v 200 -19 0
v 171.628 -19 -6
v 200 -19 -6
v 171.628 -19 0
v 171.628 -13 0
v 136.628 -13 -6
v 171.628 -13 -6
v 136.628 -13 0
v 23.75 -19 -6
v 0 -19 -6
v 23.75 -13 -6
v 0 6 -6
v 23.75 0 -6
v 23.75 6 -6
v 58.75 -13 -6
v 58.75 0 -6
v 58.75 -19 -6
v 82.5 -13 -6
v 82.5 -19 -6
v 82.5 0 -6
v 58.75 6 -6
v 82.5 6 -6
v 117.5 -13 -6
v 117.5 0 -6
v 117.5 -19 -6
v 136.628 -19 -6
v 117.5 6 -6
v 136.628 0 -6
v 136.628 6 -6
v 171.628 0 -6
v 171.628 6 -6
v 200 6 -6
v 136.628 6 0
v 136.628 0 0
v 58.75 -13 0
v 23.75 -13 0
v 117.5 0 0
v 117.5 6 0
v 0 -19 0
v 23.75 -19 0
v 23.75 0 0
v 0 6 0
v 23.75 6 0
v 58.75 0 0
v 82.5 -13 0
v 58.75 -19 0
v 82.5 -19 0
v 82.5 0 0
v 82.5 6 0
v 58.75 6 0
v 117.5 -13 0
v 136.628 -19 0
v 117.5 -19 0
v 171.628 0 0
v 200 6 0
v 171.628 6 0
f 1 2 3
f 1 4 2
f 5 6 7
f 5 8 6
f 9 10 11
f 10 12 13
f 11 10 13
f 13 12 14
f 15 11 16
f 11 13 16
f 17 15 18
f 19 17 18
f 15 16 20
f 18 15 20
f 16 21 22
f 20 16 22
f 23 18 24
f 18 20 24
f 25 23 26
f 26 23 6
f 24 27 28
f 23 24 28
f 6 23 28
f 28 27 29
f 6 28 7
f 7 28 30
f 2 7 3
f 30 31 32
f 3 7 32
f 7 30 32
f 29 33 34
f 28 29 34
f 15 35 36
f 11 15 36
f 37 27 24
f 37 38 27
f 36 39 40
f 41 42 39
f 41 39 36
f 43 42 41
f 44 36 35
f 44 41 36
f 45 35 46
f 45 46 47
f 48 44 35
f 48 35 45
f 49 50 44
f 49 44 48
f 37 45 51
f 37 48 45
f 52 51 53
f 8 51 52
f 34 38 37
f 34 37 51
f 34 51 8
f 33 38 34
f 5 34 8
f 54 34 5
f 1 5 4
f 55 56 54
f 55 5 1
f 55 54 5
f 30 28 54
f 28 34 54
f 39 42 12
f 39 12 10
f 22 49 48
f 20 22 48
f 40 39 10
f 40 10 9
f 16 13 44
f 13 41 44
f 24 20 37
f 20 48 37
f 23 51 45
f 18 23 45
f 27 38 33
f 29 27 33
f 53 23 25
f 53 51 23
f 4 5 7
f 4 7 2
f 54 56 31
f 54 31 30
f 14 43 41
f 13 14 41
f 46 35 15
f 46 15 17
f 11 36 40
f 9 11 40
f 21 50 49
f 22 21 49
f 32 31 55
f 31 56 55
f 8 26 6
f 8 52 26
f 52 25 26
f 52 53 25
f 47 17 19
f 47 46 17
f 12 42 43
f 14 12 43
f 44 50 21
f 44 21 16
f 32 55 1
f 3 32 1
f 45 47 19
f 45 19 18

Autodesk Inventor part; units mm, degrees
ref_plane "YZ Plane" through (0, 0, 0) normal (1, 0, 0) x (0, 1, 0)
ref_plane "XZ Plane" through (0, 0, 0) normal (0, 1, 0) x (-1, 0, 0)
ref_plane "XY Plane" through (0, 0, 0) normal (0, 0, 1) x (1, 0, 0)
sketch "Sketch1" plane through (0, 0, 0) normal (0, 0, 1) x (1, 0, 0)
  line L0 (200, 0) -> (171.6283, 0) construction
  line L1 (200, 6) -> (200, 0)
  line L2 (171.6283, 6) -> (200, 6)
  line L3 (171.6283, 6) -> (171.6283, 0)
  line L4 (136.6283, 6) -> (136.6283, 0)
  line L5 (136.6283, 0) -> (171.6283, 0)
  line L6 (171.6283, 0) -> (171.6283, 6)
  line L7 (136.6283, 6) -> (171.6283, 6)
  line L8 (136.6283, 0) -> (117.5, 0) construction
  line L9 (136.6283, 6) -> (136.6283, 0)
  line L10 (117.5, 6) -> (136.6283, 6)
  line L11 (117.5, 6) -> (117.5, 0)
  line L12 (117.5, 0) -> (117.5, 6)
  line L13 (82.5, 6) -> (117.5, 6)
  line L14 (82.5, 6) -> (82.5, 0)
  line L15 (82.5, 0) -> (117.5, 0)
  line L16 (82.5, 0) -> (58.75, 0) construction
  line L17 (82.5, 6) -> (82.5, 0)
  line L18 (58.75, 6) -> (82.5, 6)
  line L19 (58.75, 6) -> (58.75, 0)
  line L20 (23.75, 6) -> (23.75, 0)
  line L21 (23.75, 0) -> (58.75, 0)
  line L22 (58.75, 0) -> (58.75, 6)
  line L23 (23.75, 6) -> (58.75, 6)
  line L24 (23.75, 0) -> (0, 0) construction
  line L25 (23.75, 6) -> (23.75, 0)
  line L26 (0, 6) -> (23.75, 6)
  line L27 (0, 0) -> (0, 6)
  line L28 (200, 6) -> (1.5061, 6)
  line L29 (1.5061, 6) -> (1.5061, -19)
  line L30 (1.5061, -19) -> (200, -19)
  line L31 (200, -19) -> (200, 6)
extrude "Extrusion1" add sketch "Sketch1" against normal blind 6 contours L1 L31 L30 L29 L26 L20 L21 L19 L18 L14 L15 L11 L10 L4 L5 L3 L2
sketch "Sketch2" plane through (0, 0, 0) normal (0, 0, 1) x (1, 0, 0)
  line L0 (200, 6) -> (171.6283, 6) projected
  line L1 (171.6283, 0) -> (171.6283, 6) projected
  line L2 (136.6283, 0) -> (171.6283, 0) projected
  line L3 (136.6283, 6) -> (136.6283, 0) projected
  line L4 (136.6283, 6) -> (117.5, 6) projected
  line L5 (117.5, 0) -> (82.5, 0) projected
  line L6 (82.5, 6) -> (82.5, 0) projected
  line L7 (82.5, 6) -> (58.75, 6) projected
  line L8 (58.75, 0) -> (58.75, 6) projected
  line L9 (58.75, 0) -> (23.75, 0) projected
  line L10 (23.75, 0) -> (23.75, 6) projected
  line L11 (23.75, 6) -> (1.5061, 6) projected
  line L12 (1.5061, -19) -> (200, -19) construction
  line L13 (200, -19) -> (1.5061, -19) construction
  line L14 (195.1496, -19) -> (195.1496, 6) construction
  line L15 (171.6283, 6) -> (200, 6) construction
  line L16 (195.1496, -6.5) -> (183.8978, -6.5) construction
  line L17 (200, -19) -> (171.6283, -19)
  line L18 (171.6283, -13) -> (171.6283, -19)
  line L19 (136.6283, -13) -> (171.6283, -13)
  line L20 (136.6283, -19) -> (136.6283, -13)
  line L21 (136.6283, -19) -> (117.5, -19)
  line L22 (117.5, -13) -> (82.5, -13)
  line L23 (82.5, -19) -> (82.5, -13)
  line L24 (82.5, -19) -> (58.75, -19)
  line L25 (58.75, -13) -> (58.75, -19)
  line L26 (58.75, -13) -> (23.75, -13)
  line L27 (23.75, -13) -> (23.75, -19)
  line L28 (23.75, -19) -> (1.5061, -19)
  line L29 (195.1496, 6) -> (195.1496, -19) construction
  line L30 (171.6283, -19) -> (200, -19) construction
  line L31 (117.5, -13) -> (117.5, -19)
  line L32 (82.5, -19) -> (117.5, -19)
  line L33 (23.75, -19) -> (58.75, -19)
  line L34 (171.6283, -19) -> (136.6283, -19)
  point P0 (0, 0)
  point P1 (0, -13)
extrude "Extrusion2" cut sketch "Sketch2" against normal through all
move faces "Move1" translate (-1.5061, 0, 0) faces at (1.5061, -2.3333, -2)
properties part number "top"
